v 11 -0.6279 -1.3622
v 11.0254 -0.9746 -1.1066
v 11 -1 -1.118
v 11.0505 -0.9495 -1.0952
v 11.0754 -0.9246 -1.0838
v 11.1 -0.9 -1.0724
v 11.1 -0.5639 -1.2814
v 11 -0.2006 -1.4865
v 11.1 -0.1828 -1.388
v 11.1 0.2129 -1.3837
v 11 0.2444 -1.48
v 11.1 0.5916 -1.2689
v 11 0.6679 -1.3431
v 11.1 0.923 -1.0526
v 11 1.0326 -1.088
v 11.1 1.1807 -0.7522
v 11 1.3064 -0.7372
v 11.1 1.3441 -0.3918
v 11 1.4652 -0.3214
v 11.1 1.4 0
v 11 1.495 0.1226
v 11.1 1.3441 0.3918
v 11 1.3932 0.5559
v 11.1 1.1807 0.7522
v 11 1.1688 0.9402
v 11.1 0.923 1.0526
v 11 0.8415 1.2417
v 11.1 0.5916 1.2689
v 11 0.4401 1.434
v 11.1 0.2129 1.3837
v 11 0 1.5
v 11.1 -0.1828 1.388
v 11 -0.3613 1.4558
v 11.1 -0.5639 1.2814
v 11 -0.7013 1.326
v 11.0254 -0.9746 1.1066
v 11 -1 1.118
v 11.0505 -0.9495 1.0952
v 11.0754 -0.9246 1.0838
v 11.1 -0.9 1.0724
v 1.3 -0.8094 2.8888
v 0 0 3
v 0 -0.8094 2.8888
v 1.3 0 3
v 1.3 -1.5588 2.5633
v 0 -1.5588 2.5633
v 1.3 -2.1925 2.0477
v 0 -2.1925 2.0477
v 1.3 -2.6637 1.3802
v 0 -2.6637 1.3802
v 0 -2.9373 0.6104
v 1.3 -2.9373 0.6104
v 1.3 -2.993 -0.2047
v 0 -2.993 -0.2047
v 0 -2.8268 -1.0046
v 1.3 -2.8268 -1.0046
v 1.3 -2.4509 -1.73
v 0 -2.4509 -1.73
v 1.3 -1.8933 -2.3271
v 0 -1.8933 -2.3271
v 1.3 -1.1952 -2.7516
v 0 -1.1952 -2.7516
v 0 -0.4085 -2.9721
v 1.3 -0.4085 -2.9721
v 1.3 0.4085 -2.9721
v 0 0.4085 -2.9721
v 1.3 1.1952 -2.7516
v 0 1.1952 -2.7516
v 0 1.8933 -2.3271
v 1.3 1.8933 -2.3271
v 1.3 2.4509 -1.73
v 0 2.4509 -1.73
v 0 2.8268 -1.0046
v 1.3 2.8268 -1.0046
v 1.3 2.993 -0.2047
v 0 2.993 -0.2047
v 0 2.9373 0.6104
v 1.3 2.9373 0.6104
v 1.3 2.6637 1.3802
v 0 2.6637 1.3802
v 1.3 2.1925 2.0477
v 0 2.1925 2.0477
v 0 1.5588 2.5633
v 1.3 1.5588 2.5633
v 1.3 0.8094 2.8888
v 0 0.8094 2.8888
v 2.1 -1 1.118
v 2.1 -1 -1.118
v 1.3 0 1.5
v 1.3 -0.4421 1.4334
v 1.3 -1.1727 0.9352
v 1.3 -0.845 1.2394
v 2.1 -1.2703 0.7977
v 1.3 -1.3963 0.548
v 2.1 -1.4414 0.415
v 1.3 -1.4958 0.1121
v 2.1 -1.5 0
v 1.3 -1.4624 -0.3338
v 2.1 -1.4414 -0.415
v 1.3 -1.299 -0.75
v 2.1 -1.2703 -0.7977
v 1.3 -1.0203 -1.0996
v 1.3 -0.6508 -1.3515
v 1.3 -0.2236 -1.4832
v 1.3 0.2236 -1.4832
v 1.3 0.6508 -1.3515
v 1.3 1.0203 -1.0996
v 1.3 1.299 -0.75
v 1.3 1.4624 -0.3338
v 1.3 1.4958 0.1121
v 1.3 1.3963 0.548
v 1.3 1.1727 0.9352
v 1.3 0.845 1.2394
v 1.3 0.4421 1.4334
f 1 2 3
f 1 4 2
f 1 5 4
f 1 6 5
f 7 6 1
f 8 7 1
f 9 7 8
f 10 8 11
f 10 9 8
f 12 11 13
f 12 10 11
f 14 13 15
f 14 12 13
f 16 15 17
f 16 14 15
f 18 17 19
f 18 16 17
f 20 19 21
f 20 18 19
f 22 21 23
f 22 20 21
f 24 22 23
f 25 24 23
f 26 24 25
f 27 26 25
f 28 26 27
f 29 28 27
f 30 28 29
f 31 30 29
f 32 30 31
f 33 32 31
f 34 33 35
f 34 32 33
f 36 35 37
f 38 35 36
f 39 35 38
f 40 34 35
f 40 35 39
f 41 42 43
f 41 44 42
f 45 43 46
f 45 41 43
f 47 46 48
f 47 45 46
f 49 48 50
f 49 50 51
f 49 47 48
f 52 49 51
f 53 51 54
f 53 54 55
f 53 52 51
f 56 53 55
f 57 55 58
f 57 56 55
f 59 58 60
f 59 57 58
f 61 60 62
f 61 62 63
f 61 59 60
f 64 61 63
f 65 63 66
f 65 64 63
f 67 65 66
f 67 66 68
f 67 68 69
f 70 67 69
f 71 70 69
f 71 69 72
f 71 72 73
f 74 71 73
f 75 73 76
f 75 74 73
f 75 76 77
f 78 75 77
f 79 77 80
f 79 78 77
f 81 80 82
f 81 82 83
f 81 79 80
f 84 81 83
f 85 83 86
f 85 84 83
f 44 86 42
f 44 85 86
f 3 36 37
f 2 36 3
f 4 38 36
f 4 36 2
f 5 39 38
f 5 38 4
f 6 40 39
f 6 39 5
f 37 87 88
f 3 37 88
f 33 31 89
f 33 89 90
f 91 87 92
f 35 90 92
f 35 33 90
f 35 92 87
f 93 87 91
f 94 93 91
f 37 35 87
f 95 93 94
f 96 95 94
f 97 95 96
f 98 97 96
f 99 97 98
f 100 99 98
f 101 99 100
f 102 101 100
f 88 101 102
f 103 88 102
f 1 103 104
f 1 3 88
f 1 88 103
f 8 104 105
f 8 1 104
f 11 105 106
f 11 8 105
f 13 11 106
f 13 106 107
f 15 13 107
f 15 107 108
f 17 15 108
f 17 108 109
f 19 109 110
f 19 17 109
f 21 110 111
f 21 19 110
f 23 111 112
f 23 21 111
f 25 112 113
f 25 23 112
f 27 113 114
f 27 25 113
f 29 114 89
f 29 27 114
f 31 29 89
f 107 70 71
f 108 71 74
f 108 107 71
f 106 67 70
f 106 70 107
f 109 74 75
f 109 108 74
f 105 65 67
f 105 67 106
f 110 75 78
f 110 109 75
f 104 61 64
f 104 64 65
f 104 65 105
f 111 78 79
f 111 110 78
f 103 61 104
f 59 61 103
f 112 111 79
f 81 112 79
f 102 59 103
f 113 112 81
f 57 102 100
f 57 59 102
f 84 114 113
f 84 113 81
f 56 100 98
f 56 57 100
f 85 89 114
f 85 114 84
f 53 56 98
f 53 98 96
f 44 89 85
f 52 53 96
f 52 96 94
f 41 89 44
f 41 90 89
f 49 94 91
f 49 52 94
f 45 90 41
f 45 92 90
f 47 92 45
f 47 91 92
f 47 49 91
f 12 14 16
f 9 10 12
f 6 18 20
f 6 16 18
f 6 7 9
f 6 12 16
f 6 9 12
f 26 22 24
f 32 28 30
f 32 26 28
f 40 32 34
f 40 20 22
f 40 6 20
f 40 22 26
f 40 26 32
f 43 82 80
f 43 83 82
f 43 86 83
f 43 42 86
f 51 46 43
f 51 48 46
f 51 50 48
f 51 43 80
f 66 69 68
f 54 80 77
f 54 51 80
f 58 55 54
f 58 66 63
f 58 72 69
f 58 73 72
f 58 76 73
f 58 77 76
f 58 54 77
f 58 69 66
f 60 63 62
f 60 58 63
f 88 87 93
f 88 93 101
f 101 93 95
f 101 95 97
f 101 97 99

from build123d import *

# Parameters (mm, degrees)
SKIZZE2_W                       = 2.236067978
SKIZZE2_H                       = 0.5
SCHNITT_LINEAR_AUSTRAGEN1_DEPTH = 9
FASE1_SIZE                      = 0.1


with BuildPart() as part:
    # Skizze1 → Rotation1 (revolve)
    with BuildSketch(Plane.XY, mode=Mode.PRIVATE) as rotation1_sk:
        Polygon((0, 0), (0, 3), (1.3, 3), (1.3, 1.5), (11.1, 1.5), (11.1, 0), align=None)
    revolve(rotation1_sk.sketch.rotate(Axis((0, 0, 0), (1, 0, 0)), 90), axis=Axis((0, 0, 0), (1, 0, 0)))

    # Skizze2 → Schnitt-Linear austragen1 (cut)
    with BuildSketch(Plane(origin=(11.1, 0, 0), x_dir=(0, 0, -1), z_dir=(1, 0, 0))):
        with Locations((0, -1.25)):
            Rectangle(SKIZZE2_W, SKIZZE2_H)
    extrude(amount=-SCHNITT_LINEAR_AUSTRAGEN1_DEPTH, mode=Mode.SUBTRACT)

    # Fase1
    fase1_edges = [part.edges().sort_by_distance(p)[0] for p in [
        (11.1, 1.401258538, -0.535233135),
        (11.1, -1, 0),
    ]]
    chamfer(fase1_edges, length=FASE1_SIZE)


solid = part.part
